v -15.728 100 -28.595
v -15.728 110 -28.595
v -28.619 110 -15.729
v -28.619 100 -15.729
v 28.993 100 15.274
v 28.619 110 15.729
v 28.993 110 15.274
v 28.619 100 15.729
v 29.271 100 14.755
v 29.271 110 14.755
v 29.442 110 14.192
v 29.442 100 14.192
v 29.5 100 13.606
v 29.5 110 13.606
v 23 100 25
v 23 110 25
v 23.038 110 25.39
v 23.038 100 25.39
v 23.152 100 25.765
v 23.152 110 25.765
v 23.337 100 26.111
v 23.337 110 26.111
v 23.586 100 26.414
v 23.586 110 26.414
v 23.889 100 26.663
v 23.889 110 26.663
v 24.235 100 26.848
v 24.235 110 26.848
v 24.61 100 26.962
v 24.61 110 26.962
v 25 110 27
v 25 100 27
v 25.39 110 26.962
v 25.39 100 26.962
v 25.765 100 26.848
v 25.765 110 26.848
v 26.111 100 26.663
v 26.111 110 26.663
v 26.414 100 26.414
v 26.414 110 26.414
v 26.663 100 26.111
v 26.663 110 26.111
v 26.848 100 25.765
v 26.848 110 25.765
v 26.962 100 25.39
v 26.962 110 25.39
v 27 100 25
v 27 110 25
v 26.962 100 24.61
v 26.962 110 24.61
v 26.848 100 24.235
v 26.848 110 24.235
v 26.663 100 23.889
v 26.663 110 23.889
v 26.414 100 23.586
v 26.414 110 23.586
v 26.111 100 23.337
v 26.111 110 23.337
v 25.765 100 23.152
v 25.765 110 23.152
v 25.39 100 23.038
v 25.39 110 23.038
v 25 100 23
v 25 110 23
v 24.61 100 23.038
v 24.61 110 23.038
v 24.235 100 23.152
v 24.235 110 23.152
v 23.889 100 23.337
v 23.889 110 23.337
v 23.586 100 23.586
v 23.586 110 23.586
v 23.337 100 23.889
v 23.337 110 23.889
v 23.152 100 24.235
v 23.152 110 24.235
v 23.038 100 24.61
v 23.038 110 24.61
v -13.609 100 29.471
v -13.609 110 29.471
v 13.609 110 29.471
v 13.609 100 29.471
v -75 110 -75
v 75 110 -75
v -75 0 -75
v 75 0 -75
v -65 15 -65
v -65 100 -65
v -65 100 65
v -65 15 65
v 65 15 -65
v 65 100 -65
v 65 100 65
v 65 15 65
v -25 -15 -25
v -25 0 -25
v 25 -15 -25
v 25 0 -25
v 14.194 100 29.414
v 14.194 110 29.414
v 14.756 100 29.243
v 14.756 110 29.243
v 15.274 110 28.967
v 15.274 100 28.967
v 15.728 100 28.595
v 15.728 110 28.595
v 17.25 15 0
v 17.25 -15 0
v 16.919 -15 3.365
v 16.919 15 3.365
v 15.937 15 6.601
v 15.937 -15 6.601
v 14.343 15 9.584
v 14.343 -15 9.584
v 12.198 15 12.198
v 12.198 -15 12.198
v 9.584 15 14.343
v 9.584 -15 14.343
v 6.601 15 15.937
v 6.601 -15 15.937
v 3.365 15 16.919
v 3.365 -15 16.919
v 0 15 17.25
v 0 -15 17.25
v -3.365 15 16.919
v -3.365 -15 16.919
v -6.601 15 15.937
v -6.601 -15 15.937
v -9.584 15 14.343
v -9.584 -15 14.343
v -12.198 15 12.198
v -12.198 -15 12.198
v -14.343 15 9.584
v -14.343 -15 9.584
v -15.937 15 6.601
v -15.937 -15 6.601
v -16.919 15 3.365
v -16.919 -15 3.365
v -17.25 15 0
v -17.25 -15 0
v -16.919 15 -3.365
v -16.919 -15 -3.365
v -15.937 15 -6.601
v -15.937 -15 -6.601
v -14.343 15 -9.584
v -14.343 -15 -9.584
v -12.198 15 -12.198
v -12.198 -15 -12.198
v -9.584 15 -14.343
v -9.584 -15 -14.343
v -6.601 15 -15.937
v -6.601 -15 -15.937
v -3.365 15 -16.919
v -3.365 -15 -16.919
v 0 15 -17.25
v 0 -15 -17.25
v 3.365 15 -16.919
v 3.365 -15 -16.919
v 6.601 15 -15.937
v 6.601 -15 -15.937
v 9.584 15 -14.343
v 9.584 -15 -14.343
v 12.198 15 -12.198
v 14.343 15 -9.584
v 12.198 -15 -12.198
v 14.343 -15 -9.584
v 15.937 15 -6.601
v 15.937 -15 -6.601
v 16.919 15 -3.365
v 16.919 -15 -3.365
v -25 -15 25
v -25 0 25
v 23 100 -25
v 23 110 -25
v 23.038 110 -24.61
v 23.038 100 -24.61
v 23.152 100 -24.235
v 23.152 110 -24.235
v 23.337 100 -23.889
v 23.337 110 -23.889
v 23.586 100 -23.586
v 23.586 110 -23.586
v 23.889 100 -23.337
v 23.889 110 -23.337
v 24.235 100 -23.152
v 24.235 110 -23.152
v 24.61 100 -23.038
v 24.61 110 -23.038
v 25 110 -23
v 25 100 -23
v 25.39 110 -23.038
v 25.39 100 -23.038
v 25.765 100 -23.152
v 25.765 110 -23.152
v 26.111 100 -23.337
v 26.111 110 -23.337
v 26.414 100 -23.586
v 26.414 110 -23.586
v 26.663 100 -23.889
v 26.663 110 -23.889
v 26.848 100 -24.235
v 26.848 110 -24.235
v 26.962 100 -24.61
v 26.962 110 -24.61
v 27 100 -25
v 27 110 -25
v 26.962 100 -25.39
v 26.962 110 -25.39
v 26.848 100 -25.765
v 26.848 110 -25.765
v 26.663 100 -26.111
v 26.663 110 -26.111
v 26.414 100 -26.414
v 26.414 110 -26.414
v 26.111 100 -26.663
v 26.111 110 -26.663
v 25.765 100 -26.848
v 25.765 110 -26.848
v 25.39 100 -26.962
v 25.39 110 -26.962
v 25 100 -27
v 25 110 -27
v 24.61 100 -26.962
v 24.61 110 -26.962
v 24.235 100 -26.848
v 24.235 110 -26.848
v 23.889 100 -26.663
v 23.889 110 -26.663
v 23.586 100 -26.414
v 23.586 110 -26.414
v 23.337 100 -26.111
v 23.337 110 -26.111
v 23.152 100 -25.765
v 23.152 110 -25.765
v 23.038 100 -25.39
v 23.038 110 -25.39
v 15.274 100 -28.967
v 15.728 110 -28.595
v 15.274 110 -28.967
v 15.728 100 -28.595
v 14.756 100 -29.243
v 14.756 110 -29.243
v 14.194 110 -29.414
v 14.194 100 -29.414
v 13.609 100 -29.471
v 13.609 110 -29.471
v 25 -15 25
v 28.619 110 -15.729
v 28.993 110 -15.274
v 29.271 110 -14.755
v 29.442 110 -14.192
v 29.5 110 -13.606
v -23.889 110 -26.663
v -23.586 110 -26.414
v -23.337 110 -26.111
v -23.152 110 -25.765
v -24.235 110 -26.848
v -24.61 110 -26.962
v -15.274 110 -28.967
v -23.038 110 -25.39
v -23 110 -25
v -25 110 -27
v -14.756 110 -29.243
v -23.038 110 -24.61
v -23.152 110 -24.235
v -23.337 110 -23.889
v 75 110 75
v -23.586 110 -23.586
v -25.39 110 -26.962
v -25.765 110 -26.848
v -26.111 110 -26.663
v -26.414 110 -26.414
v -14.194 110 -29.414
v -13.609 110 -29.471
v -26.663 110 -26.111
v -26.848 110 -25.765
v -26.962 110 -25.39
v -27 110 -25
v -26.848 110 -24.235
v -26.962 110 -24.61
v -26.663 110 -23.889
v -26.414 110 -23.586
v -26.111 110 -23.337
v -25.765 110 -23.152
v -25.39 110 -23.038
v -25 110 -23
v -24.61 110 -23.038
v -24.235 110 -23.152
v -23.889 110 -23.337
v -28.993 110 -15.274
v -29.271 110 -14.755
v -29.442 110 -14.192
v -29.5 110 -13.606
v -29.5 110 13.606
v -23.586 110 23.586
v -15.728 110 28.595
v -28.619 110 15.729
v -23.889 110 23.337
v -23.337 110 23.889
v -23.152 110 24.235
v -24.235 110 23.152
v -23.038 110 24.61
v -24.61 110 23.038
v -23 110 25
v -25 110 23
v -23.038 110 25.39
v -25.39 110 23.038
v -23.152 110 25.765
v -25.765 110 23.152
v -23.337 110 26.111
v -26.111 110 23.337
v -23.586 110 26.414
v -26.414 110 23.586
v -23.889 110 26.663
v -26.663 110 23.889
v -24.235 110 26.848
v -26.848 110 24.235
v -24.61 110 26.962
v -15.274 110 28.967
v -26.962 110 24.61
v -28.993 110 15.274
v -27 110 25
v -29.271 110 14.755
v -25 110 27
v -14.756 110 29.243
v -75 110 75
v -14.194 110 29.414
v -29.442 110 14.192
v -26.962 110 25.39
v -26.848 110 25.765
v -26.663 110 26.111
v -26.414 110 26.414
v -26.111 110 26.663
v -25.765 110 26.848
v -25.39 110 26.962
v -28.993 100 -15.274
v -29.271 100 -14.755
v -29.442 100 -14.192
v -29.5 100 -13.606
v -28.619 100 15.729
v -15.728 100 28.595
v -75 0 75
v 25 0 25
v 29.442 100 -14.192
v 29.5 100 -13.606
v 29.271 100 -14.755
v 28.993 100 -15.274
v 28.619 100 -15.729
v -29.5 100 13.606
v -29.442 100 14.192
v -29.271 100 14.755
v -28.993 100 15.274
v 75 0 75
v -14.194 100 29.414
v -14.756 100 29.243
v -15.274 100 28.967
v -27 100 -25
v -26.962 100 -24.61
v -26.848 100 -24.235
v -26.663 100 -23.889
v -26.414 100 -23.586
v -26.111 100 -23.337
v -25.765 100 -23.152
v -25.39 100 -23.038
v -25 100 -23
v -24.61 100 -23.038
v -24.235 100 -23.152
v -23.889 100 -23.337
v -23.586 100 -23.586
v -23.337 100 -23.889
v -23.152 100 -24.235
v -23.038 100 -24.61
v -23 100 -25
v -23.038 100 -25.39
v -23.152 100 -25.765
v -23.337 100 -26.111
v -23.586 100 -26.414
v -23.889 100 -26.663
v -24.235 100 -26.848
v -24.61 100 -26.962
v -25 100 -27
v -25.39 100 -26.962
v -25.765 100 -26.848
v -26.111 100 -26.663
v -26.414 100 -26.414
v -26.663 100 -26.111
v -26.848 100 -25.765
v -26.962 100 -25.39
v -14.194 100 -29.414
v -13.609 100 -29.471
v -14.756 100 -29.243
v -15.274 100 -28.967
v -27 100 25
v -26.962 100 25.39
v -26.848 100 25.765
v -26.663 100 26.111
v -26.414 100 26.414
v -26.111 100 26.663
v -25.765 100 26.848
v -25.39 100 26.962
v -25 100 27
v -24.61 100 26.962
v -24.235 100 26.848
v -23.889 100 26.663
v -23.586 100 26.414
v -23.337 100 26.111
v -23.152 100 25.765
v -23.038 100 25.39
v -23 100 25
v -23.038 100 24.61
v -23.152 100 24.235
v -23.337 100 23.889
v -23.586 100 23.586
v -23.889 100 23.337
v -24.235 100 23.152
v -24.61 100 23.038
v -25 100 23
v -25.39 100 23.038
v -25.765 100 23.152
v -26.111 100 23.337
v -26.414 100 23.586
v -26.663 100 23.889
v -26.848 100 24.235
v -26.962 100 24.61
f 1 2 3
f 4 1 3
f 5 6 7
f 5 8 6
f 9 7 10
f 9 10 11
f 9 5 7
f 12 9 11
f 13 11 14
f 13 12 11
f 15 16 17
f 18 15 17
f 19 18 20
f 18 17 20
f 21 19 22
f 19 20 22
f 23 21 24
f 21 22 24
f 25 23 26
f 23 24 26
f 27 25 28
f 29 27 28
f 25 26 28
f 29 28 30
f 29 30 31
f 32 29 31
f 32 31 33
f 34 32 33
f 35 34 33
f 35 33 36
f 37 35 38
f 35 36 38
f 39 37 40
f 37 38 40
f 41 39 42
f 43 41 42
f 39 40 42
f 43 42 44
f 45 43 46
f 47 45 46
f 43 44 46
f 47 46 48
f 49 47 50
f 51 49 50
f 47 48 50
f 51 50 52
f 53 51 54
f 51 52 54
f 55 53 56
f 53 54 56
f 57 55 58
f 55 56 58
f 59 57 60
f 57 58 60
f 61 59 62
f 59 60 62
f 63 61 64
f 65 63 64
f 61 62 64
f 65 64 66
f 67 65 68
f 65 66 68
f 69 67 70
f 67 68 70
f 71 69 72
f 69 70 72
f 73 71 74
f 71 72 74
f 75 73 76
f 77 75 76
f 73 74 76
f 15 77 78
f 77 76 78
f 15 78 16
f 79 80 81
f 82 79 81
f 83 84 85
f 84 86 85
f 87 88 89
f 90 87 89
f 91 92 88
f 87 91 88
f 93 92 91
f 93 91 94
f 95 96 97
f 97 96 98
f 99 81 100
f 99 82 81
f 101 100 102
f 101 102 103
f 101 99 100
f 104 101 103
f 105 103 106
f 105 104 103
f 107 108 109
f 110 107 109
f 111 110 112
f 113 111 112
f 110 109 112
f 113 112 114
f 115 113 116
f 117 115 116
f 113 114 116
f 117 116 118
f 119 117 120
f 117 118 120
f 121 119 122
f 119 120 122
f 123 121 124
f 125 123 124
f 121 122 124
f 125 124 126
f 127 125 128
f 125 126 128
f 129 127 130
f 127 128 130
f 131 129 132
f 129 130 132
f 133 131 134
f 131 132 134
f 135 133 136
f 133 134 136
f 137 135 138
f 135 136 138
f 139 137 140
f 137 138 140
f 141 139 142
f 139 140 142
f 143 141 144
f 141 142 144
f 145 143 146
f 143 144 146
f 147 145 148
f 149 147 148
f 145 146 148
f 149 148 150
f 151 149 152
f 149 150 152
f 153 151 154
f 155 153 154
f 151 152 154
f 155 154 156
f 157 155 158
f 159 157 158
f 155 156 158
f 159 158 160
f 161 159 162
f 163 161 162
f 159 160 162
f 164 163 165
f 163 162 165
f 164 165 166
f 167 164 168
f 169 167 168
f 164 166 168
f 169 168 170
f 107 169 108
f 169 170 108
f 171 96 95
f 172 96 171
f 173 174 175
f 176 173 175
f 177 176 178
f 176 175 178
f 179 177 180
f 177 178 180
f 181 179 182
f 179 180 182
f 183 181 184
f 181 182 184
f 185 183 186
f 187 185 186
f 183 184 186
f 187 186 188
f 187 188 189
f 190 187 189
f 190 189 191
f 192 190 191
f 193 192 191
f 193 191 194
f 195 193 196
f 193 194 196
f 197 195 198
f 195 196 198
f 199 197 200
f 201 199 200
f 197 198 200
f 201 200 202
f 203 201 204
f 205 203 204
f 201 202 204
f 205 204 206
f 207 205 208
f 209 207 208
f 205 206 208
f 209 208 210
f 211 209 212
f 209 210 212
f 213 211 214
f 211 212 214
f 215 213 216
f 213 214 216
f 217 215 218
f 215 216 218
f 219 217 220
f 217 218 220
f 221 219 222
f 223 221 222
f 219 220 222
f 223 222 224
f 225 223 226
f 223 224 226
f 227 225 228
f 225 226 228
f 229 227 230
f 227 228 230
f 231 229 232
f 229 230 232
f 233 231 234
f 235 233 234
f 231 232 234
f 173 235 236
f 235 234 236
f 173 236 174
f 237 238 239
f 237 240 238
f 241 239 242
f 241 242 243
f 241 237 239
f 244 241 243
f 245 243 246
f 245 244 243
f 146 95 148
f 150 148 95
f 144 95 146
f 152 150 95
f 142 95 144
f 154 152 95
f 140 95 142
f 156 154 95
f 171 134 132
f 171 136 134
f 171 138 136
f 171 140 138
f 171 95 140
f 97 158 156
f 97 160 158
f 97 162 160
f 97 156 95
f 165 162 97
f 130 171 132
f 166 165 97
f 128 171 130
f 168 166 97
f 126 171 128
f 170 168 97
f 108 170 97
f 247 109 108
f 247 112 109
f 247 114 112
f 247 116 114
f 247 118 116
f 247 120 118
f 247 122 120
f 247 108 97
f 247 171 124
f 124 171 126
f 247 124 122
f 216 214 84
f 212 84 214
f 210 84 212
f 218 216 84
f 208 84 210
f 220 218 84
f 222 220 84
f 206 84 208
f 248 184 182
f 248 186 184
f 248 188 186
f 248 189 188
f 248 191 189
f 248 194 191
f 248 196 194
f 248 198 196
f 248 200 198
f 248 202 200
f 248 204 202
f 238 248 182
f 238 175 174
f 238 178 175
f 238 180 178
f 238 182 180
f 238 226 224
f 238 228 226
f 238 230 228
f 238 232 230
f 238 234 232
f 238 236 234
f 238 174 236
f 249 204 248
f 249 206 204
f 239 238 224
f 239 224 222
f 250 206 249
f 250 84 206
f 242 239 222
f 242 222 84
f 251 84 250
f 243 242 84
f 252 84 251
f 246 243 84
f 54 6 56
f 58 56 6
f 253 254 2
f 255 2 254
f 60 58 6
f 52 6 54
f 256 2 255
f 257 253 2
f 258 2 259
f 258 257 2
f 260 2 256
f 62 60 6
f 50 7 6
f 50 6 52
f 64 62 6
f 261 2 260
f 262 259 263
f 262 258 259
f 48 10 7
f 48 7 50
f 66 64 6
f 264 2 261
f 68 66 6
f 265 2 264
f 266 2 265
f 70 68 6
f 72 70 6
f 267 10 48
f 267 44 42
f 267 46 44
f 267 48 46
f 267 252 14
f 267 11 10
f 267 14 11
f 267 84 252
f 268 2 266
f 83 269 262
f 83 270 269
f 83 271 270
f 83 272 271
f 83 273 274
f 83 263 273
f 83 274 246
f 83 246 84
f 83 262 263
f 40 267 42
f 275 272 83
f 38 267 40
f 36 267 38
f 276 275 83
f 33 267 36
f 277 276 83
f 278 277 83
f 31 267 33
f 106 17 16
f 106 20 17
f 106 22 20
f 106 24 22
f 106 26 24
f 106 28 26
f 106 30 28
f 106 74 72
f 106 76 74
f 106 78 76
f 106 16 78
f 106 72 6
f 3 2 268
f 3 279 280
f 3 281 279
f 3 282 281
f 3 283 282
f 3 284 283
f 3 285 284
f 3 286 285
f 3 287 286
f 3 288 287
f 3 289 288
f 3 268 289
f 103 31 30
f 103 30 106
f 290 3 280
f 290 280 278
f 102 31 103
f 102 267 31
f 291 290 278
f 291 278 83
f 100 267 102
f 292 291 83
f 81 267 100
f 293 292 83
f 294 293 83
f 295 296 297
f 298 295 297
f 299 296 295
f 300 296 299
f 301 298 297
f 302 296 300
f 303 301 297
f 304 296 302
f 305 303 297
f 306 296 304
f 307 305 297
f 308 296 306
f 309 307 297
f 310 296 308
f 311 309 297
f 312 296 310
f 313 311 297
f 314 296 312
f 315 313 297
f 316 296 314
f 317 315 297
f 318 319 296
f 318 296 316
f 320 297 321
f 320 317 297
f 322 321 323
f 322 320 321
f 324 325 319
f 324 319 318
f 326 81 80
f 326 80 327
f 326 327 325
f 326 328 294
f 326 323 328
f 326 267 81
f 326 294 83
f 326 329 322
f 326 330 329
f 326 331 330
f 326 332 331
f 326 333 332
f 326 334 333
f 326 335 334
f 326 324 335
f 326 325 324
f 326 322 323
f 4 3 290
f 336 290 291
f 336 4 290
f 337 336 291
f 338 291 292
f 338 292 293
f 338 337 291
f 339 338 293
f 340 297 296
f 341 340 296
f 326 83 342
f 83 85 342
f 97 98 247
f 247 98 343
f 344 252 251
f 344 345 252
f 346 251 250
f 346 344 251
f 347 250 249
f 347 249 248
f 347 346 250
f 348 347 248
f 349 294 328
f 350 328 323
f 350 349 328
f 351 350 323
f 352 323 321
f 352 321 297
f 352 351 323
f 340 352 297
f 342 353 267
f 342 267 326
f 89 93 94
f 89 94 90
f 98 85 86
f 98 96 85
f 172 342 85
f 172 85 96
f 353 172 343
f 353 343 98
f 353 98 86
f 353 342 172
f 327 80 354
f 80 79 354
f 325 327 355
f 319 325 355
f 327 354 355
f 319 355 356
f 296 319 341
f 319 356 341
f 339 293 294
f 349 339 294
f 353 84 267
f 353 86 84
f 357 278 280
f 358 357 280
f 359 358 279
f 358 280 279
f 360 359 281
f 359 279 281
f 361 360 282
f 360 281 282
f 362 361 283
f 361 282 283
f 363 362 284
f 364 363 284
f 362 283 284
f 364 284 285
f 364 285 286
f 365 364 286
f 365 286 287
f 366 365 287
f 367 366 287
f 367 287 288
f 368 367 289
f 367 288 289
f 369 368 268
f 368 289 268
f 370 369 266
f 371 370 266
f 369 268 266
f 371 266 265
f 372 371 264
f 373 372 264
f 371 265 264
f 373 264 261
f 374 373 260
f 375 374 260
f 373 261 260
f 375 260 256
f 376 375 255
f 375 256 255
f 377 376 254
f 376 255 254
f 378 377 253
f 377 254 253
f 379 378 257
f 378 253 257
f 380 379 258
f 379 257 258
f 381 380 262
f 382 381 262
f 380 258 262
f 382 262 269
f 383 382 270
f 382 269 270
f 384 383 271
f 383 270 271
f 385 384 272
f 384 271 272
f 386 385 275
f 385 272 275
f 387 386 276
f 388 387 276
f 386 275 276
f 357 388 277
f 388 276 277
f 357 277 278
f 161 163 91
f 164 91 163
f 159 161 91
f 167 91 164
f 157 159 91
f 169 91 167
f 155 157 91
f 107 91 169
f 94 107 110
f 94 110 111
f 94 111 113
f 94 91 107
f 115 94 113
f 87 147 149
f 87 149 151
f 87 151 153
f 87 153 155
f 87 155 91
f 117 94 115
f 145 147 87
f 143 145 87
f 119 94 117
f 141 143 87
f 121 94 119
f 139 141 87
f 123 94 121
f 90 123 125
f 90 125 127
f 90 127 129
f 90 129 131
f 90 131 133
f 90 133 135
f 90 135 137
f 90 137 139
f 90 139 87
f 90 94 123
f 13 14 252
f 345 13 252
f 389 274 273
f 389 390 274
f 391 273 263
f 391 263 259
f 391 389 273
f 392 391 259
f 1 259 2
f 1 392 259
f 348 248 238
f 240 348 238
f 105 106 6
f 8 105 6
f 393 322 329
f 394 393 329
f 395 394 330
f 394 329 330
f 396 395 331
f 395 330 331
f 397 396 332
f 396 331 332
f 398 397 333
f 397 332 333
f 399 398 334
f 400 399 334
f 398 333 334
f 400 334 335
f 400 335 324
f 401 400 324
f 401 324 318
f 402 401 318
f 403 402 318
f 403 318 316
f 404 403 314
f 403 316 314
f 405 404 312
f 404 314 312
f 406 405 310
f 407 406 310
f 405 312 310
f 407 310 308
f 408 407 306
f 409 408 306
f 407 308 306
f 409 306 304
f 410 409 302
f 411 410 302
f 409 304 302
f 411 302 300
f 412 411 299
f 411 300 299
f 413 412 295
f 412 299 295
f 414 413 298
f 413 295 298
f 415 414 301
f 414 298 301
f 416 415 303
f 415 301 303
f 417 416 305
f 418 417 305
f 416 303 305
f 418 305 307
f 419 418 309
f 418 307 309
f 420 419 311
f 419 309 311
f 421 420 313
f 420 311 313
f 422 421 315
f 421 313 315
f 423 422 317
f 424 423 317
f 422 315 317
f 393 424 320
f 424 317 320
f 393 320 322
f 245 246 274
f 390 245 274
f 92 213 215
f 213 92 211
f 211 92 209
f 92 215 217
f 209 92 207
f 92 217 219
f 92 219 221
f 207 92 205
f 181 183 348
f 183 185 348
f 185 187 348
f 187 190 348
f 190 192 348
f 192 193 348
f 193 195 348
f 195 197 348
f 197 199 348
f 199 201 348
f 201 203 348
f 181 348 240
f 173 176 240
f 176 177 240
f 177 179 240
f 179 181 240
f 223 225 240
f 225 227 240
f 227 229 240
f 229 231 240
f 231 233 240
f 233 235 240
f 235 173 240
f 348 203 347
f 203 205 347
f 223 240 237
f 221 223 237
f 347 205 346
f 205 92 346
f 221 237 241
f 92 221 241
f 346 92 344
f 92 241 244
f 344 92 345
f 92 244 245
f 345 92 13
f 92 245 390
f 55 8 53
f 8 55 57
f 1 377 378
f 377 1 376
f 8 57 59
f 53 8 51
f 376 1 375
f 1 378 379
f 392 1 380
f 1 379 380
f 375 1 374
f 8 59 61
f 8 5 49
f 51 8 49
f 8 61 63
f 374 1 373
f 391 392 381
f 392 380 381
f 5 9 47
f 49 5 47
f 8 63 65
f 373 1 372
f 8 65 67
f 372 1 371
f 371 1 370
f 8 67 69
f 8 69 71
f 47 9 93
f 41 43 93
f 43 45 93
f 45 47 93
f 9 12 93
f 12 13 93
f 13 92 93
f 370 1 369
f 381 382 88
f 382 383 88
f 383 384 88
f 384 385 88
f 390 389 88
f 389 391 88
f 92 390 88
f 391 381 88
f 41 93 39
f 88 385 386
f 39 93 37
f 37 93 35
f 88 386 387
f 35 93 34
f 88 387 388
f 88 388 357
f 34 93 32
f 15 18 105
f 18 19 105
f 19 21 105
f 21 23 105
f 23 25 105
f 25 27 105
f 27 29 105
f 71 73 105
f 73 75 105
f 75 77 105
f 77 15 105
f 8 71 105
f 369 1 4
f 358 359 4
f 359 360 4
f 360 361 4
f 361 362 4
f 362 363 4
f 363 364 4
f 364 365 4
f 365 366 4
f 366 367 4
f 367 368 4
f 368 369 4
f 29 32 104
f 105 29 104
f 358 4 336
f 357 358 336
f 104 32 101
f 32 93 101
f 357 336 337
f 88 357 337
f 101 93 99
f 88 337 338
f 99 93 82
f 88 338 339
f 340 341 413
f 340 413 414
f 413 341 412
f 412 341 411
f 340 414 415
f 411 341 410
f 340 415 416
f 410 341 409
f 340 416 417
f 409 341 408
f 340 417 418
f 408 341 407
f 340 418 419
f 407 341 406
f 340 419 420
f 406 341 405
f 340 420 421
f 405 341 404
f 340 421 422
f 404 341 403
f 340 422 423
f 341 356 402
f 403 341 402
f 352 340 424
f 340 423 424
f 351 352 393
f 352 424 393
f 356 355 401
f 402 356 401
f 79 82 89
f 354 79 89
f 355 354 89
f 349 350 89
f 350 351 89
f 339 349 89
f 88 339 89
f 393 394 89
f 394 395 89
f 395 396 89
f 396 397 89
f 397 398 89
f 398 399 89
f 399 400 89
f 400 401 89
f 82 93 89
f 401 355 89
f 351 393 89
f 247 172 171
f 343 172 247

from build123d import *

# Parameters (mm, degrees)
F0_W      = 150
F0_H      = 150
F1_DEPTH  = 100
F2_W      = 130
F2_H      = 130
F3_DEPTH  = 85
F4_W      = 150
F4_H      = 150
F5_DEPTH  = 10
F6_W      = 50
F6_H      = 50
F7_DEPTH  = 15
F8_R      = 17.25
F9_DEPTH  = 30
F10_R     = 2
F11_DEPTH = 10
F13_DEPTH = 10
F14_R     = 3


with BuildPart() as f1:
    # F0 (on Front) → F1 (new body)
    with BuildSketch(Plane.XZ):
        Rectangle(F0_W, F0_H)
    extrude(amount=-F1_DEPTH)

    # F2 (on face) → F3 (cut)
    with BuildSketch(Plane(origin=(0, 100, 0), x_dir=(-1, 0, 0), z_dir=(0, 1, 0))):
        Rectangle(F2_W, F2_H)
    extrude(amount=-F3_DEPTH, mode=Mode.SUBTRACT)

    # F4 (on face) → F5 (join)
    with BuildSketch(Plane(origin=(0, 100, 0), x_dir=(-1, 0, 0), z_dir=(0, 1, 0))):
        Rectangle(F4_W, F4_H)
    extrude(amount=F5_DEPTH)

    # F6 (on face) → F7 (join)
    with BuildSketch(Plane.XZ):
        Rectangle(F6_W, F6_H)
    extrude(amount=F7_DEPTH)

    # F8 (on face) → F9 (cut, through all)
    with BuildSketch(Plane.XZ.offset(15)):
        Circle(F8_R)
    extrude(amount=-F9_DEPTH, mode=Mode.SUBTRACT)

    # F10 (on face) → F11 (cut, through all)
    with BuildSketch(Plane(origin=(0, 110, 0), x_dir=(-1, 0, 0), z_dir=(0, 1, 0))):
        with Locations((25, 25)):
            Circle(F10_R)
        with Locations((25, -25)):
            Circle(F10_R)
        with Locations((-25, 25)):
            Circle(F10_R)
        with Locations((-25, -25)):
            Circle(F10_R)
    extrude(amount=-F11_DEPTH, mode=Mode.SUBTRACT)

    # F12 (on face) → F13 (cut, through all)
    with BuildSketch(Plane(origin=(0, 110, 0), x_dir=(-1, 0, 0), z_dir=(0, 1, 0))):
        Polygon((14.85, 29.471261), (-14.85, 29.471261), (-29.5, 14.85), (-29.5, -14.85), (-14.85, -29.471261), (14.85, -29.471261), (29.5, -14.85), (29.5, 14.85), align=None)
    extrude(amount=-F13_DEPTH, mode=Mode.SUBTRACT)

    # F14
    f14_edges = [f1.edges().sort_by_distance(p)[0] for p in [
        (29.5, 105, 14.85),
        (14.85, 105, 29.471261),
        (29.5, 105, -14.85),
        (14.85, 105, -29.471261),
        (-14.85, 105, -29.471261),
        (-14.85, 105, 29.471261),
        (-29.5, 105, 14.85),
        (-29.5, 105, -14.85),
    ]]
    fillet(f14_edges, radius=F14_R)


solid = f1.part
